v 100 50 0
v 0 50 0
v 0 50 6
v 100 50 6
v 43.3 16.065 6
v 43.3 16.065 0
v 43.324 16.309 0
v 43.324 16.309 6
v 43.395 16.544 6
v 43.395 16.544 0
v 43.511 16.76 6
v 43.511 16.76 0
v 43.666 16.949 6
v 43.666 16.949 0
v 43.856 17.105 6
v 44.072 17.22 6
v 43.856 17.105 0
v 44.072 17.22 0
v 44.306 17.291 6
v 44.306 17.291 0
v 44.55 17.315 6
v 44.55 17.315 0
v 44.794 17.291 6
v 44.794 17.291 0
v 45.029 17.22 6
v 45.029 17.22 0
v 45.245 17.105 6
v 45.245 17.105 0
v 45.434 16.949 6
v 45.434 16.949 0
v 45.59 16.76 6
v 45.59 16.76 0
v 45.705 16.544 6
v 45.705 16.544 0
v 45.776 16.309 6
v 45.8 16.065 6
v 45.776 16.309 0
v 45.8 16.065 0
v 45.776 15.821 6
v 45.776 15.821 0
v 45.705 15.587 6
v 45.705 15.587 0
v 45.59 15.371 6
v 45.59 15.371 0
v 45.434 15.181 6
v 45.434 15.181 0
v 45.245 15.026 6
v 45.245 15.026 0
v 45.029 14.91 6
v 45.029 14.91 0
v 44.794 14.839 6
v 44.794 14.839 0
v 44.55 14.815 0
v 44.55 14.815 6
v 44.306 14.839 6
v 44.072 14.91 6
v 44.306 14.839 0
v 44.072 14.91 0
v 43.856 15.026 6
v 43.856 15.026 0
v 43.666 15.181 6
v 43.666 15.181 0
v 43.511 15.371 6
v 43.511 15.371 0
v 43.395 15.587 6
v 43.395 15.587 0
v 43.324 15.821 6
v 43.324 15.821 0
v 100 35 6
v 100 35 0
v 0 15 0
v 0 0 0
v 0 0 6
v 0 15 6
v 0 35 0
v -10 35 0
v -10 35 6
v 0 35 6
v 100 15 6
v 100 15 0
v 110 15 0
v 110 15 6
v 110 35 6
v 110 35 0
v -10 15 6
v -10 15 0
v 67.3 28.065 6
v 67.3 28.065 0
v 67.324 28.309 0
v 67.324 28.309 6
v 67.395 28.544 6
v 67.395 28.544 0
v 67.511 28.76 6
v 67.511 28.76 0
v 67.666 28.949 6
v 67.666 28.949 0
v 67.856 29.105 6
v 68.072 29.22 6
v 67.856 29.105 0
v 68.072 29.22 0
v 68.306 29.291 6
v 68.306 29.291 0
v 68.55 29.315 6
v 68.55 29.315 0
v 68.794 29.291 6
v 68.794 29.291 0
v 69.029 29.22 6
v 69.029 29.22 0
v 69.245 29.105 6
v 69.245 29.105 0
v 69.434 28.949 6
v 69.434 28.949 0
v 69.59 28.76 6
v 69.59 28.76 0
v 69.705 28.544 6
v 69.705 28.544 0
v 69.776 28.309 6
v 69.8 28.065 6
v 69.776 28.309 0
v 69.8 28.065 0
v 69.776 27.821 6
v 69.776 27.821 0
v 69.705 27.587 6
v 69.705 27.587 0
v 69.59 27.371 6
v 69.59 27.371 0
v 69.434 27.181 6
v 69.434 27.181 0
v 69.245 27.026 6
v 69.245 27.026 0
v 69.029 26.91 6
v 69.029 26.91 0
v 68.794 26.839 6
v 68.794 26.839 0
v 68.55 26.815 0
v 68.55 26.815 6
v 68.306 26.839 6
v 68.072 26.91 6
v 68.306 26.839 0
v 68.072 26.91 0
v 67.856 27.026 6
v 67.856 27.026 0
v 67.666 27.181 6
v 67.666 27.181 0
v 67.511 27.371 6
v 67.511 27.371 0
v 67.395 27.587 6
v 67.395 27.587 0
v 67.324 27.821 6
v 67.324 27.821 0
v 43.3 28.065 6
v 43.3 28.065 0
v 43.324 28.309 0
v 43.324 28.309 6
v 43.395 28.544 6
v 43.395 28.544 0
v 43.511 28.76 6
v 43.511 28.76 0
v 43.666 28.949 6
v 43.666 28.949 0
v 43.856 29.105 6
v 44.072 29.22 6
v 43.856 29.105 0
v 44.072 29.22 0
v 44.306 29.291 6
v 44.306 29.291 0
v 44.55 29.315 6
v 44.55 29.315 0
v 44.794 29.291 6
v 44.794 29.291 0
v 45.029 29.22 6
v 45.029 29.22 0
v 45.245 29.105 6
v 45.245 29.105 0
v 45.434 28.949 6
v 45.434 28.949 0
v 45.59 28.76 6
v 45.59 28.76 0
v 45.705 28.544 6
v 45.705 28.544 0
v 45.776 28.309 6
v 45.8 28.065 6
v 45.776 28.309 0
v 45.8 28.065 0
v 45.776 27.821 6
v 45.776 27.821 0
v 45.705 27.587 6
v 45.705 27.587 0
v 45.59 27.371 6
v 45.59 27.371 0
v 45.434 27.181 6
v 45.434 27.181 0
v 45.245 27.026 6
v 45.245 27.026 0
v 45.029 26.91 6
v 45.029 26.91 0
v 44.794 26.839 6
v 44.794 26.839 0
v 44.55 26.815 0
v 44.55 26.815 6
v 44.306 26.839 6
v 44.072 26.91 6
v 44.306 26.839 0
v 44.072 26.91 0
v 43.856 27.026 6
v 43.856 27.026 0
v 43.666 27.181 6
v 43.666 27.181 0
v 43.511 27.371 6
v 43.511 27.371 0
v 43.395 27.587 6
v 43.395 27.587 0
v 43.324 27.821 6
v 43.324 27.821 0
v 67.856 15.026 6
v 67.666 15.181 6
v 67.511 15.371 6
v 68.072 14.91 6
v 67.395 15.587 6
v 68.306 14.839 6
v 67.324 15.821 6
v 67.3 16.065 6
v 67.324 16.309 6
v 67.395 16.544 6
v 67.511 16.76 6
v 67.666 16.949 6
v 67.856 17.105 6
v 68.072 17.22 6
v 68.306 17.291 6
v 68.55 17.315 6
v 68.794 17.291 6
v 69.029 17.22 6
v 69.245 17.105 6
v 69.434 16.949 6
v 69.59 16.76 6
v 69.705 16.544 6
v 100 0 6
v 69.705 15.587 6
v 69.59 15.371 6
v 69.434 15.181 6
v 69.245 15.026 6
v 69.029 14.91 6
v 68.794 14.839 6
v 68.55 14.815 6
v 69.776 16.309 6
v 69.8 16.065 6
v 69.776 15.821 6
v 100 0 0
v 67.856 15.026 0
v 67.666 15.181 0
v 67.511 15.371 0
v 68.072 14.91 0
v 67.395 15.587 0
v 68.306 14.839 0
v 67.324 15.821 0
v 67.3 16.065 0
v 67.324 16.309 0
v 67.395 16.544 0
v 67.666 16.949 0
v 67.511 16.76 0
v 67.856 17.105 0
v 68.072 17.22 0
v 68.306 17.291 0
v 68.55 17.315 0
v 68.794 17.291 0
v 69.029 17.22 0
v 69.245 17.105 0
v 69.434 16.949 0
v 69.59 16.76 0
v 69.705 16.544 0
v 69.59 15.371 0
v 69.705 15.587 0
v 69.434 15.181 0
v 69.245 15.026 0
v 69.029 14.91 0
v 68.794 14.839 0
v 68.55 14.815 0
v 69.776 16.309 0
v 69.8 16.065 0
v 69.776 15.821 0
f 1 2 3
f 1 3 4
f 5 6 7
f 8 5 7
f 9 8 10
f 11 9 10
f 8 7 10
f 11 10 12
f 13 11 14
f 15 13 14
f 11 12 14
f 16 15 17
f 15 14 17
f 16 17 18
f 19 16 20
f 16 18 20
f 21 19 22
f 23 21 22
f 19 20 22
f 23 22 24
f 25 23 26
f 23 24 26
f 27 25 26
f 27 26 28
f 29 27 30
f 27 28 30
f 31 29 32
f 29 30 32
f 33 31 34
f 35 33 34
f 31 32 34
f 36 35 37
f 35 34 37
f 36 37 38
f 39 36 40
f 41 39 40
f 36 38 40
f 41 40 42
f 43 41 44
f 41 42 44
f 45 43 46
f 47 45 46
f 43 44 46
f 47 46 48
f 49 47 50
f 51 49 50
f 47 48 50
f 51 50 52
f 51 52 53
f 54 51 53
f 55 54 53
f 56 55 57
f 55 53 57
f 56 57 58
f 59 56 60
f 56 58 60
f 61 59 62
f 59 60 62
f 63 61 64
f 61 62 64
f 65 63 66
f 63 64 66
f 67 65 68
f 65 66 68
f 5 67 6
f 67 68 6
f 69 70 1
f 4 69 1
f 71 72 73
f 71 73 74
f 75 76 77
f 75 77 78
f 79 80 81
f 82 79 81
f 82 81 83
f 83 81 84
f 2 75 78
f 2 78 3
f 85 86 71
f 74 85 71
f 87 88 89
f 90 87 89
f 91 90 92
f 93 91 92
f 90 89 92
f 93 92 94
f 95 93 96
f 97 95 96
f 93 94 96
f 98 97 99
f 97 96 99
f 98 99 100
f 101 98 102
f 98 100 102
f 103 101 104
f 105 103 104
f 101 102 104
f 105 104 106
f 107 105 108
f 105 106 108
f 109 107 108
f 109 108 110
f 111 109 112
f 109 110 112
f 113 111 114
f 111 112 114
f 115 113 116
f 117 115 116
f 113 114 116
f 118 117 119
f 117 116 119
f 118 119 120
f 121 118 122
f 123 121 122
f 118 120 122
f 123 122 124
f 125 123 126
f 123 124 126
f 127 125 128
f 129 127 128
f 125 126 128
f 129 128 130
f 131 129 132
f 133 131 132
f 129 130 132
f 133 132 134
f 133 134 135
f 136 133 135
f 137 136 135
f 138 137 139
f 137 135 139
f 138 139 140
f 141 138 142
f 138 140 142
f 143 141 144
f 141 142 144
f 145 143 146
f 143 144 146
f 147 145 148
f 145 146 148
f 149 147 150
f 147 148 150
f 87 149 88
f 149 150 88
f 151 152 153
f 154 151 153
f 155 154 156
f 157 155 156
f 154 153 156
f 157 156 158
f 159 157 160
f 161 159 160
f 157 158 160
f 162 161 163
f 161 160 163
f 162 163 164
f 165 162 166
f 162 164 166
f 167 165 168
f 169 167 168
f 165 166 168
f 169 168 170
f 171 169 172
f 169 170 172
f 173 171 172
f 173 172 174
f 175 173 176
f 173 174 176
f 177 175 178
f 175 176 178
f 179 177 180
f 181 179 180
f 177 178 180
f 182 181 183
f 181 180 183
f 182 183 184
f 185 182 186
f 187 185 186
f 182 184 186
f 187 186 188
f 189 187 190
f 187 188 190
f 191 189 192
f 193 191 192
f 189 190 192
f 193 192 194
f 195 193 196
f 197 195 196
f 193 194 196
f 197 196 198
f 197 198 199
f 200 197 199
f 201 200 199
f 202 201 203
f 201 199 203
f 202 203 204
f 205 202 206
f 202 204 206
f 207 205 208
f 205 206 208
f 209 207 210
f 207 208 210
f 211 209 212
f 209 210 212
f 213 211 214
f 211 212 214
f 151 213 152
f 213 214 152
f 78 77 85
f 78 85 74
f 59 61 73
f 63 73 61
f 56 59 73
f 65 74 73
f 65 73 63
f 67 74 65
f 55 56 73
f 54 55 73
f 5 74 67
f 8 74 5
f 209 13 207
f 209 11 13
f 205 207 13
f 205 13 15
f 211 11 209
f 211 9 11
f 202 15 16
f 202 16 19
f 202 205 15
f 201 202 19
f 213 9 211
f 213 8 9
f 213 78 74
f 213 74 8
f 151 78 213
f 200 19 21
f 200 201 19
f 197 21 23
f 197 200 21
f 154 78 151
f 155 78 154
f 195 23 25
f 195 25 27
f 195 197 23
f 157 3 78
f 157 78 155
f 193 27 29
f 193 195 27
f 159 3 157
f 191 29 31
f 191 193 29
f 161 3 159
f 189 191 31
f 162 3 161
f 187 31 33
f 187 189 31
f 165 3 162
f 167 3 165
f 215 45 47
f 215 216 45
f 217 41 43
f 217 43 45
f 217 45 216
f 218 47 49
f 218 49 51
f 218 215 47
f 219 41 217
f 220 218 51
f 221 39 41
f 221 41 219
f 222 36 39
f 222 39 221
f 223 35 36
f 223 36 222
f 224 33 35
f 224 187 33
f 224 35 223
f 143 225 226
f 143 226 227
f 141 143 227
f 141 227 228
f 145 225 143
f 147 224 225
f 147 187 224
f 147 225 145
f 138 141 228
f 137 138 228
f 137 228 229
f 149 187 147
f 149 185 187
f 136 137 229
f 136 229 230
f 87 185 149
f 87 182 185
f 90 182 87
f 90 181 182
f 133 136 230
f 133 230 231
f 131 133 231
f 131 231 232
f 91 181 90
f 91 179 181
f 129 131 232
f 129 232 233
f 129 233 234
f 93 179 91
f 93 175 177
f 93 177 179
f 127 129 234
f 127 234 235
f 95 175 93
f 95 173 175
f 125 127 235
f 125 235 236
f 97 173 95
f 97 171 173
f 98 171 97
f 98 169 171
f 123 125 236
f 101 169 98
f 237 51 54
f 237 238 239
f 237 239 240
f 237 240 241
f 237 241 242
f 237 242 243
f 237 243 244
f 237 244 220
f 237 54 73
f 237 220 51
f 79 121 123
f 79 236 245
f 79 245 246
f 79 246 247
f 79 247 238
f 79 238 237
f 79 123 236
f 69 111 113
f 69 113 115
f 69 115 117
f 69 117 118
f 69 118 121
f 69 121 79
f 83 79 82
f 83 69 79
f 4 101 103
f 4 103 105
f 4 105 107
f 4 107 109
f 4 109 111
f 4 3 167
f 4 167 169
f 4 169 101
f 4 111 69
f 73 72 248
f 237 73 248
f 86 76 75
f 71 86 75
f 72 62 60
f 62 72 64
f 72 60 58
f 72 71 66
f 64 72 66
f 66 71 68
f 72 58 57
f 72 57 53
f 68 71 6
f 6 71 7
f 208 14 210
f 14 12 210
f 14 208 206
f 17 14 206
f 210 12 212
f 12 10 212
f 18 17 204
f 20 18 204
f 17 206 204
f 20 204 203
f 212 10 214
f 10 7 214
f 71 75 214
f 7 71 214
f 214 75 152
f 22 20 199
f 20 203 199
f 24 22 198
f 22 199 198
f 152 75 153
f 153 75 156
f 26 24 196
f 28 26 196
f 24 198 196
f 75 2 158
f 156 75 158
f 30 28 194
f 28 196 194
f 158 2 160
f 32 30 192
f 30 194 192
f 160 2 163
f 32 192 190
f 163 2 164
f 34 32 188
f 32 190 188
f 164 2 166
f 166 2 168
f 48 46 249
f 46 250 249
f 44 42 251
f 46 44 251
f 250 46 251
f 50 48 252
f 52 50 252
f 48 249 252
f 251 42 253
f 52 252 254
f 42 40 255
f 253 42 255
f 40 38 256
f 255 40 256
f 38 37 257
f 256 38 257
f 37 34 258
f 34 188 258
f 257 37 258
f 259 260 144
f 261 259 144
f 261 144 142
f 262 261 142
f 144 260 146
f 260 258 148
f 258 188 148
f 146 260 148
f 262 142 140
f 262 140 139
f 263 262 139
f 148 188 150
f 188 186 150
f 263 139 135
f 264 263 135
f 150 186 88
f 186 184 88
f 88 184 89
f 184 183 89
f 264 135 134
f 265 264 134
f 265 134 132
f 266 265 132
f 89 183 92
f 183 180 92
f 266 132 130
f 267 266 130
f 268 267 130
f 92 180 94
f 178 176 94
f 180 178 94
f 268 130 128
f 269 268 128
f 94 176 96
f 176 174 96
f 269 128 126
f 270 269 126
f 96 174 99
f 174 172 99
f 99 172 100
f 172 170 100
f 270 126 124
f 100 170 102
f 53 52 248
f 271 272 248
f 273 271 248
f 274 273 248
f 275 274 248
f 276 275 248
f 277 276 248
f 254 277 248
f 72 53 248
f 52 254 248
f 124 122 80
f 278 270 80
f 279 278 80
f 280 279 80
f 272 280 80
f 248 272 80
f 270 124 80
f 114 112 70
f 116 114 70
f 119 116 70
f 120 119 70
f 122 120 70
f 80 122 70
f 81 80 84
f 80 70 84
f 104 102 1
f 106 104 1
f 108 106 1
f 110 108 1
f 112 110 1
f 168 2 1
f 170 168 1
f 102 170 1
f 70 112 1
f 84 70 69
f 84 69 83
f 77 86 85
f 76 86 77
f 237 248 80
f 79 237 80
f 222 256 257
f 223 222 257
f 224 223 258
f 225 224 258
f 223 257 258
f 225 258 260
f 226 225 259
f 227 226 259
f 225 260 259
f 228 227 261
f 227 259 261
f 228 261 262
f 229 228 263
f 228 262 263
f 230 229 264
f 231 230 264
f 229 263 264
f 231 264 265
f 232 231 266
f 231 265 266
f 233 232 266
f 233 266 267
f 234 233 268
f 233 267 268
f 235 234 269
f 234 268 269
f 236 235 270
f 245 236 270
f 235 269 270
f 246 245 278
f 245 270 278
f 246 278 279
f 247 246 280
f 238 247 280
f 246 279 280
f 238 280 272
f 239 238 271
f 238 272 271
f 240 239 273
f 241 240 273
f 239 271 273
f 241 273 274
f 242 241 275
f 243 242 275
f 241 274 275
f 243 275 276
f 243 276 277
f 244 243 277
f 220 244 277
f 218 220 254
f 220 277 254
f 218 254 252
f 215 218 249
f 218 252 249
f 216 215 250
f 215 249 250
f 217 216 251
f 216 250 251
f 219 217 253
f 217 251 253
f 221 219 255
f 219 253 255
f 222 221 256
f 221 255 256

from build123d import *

# Parameters (mm, degrees)
ESQUISSE1_W             = 10
ESQUISSE1_H             = 20
ESQUISSE1_W_2           = 100
ESQUISSE1_H_2           = 50
BOSS_EXTRU_1_DEPTH      = 6
ESQUISSE2_R             = 1.25
ENL_V_MAT_EXTRU_1_DEPTH = 6


with BuildPart() as part:
    # Esquisse1 → Boss.-Extru.1 (new body)
    with BuildSketch(Plane.XY):
        with Locations((-5, 25)):
            Rectangle(ESQUISSE1_W, ESQUISSE1_H)
        with Locations((50, 25)):
            Rectangle(ESQUISSE1_W_2, ESQUISSE1_H_2)
        with Locations((105, 25)):
            Rectangle(ESQUISSE1_W, ESQUISSE1_H)
    extrude(amount=BOSS_EXTRU_1_DEPTH)

    # Esquisse2 → Enlèv. mat.-Extru.1 (cut)
    with BuildSketch(Plane(origin=(0, 0, 0), x_dir=(-1, 0, 0), z_dir=(0, 0, -1))):
        with Locations((-44.550340057, 16.065313345)):
            Circle(ESQUISSE2_R)
        with Locations((-44.550340057, 28.065313345)):
            Circle(ESQUISSE2_R)
        with Locations((-68.550340057, 28.065313345)):
            Circle(ESQUISSE2_R)
        with Locations((-68.550340057, 16.065313345)):
            Circle(ESQUISSE2_R)
    extrude(amount=-ENL_V_MAT_EXTRU_1_DEPTH, mode=Mode.SUBTRACT)


solid = part.part
